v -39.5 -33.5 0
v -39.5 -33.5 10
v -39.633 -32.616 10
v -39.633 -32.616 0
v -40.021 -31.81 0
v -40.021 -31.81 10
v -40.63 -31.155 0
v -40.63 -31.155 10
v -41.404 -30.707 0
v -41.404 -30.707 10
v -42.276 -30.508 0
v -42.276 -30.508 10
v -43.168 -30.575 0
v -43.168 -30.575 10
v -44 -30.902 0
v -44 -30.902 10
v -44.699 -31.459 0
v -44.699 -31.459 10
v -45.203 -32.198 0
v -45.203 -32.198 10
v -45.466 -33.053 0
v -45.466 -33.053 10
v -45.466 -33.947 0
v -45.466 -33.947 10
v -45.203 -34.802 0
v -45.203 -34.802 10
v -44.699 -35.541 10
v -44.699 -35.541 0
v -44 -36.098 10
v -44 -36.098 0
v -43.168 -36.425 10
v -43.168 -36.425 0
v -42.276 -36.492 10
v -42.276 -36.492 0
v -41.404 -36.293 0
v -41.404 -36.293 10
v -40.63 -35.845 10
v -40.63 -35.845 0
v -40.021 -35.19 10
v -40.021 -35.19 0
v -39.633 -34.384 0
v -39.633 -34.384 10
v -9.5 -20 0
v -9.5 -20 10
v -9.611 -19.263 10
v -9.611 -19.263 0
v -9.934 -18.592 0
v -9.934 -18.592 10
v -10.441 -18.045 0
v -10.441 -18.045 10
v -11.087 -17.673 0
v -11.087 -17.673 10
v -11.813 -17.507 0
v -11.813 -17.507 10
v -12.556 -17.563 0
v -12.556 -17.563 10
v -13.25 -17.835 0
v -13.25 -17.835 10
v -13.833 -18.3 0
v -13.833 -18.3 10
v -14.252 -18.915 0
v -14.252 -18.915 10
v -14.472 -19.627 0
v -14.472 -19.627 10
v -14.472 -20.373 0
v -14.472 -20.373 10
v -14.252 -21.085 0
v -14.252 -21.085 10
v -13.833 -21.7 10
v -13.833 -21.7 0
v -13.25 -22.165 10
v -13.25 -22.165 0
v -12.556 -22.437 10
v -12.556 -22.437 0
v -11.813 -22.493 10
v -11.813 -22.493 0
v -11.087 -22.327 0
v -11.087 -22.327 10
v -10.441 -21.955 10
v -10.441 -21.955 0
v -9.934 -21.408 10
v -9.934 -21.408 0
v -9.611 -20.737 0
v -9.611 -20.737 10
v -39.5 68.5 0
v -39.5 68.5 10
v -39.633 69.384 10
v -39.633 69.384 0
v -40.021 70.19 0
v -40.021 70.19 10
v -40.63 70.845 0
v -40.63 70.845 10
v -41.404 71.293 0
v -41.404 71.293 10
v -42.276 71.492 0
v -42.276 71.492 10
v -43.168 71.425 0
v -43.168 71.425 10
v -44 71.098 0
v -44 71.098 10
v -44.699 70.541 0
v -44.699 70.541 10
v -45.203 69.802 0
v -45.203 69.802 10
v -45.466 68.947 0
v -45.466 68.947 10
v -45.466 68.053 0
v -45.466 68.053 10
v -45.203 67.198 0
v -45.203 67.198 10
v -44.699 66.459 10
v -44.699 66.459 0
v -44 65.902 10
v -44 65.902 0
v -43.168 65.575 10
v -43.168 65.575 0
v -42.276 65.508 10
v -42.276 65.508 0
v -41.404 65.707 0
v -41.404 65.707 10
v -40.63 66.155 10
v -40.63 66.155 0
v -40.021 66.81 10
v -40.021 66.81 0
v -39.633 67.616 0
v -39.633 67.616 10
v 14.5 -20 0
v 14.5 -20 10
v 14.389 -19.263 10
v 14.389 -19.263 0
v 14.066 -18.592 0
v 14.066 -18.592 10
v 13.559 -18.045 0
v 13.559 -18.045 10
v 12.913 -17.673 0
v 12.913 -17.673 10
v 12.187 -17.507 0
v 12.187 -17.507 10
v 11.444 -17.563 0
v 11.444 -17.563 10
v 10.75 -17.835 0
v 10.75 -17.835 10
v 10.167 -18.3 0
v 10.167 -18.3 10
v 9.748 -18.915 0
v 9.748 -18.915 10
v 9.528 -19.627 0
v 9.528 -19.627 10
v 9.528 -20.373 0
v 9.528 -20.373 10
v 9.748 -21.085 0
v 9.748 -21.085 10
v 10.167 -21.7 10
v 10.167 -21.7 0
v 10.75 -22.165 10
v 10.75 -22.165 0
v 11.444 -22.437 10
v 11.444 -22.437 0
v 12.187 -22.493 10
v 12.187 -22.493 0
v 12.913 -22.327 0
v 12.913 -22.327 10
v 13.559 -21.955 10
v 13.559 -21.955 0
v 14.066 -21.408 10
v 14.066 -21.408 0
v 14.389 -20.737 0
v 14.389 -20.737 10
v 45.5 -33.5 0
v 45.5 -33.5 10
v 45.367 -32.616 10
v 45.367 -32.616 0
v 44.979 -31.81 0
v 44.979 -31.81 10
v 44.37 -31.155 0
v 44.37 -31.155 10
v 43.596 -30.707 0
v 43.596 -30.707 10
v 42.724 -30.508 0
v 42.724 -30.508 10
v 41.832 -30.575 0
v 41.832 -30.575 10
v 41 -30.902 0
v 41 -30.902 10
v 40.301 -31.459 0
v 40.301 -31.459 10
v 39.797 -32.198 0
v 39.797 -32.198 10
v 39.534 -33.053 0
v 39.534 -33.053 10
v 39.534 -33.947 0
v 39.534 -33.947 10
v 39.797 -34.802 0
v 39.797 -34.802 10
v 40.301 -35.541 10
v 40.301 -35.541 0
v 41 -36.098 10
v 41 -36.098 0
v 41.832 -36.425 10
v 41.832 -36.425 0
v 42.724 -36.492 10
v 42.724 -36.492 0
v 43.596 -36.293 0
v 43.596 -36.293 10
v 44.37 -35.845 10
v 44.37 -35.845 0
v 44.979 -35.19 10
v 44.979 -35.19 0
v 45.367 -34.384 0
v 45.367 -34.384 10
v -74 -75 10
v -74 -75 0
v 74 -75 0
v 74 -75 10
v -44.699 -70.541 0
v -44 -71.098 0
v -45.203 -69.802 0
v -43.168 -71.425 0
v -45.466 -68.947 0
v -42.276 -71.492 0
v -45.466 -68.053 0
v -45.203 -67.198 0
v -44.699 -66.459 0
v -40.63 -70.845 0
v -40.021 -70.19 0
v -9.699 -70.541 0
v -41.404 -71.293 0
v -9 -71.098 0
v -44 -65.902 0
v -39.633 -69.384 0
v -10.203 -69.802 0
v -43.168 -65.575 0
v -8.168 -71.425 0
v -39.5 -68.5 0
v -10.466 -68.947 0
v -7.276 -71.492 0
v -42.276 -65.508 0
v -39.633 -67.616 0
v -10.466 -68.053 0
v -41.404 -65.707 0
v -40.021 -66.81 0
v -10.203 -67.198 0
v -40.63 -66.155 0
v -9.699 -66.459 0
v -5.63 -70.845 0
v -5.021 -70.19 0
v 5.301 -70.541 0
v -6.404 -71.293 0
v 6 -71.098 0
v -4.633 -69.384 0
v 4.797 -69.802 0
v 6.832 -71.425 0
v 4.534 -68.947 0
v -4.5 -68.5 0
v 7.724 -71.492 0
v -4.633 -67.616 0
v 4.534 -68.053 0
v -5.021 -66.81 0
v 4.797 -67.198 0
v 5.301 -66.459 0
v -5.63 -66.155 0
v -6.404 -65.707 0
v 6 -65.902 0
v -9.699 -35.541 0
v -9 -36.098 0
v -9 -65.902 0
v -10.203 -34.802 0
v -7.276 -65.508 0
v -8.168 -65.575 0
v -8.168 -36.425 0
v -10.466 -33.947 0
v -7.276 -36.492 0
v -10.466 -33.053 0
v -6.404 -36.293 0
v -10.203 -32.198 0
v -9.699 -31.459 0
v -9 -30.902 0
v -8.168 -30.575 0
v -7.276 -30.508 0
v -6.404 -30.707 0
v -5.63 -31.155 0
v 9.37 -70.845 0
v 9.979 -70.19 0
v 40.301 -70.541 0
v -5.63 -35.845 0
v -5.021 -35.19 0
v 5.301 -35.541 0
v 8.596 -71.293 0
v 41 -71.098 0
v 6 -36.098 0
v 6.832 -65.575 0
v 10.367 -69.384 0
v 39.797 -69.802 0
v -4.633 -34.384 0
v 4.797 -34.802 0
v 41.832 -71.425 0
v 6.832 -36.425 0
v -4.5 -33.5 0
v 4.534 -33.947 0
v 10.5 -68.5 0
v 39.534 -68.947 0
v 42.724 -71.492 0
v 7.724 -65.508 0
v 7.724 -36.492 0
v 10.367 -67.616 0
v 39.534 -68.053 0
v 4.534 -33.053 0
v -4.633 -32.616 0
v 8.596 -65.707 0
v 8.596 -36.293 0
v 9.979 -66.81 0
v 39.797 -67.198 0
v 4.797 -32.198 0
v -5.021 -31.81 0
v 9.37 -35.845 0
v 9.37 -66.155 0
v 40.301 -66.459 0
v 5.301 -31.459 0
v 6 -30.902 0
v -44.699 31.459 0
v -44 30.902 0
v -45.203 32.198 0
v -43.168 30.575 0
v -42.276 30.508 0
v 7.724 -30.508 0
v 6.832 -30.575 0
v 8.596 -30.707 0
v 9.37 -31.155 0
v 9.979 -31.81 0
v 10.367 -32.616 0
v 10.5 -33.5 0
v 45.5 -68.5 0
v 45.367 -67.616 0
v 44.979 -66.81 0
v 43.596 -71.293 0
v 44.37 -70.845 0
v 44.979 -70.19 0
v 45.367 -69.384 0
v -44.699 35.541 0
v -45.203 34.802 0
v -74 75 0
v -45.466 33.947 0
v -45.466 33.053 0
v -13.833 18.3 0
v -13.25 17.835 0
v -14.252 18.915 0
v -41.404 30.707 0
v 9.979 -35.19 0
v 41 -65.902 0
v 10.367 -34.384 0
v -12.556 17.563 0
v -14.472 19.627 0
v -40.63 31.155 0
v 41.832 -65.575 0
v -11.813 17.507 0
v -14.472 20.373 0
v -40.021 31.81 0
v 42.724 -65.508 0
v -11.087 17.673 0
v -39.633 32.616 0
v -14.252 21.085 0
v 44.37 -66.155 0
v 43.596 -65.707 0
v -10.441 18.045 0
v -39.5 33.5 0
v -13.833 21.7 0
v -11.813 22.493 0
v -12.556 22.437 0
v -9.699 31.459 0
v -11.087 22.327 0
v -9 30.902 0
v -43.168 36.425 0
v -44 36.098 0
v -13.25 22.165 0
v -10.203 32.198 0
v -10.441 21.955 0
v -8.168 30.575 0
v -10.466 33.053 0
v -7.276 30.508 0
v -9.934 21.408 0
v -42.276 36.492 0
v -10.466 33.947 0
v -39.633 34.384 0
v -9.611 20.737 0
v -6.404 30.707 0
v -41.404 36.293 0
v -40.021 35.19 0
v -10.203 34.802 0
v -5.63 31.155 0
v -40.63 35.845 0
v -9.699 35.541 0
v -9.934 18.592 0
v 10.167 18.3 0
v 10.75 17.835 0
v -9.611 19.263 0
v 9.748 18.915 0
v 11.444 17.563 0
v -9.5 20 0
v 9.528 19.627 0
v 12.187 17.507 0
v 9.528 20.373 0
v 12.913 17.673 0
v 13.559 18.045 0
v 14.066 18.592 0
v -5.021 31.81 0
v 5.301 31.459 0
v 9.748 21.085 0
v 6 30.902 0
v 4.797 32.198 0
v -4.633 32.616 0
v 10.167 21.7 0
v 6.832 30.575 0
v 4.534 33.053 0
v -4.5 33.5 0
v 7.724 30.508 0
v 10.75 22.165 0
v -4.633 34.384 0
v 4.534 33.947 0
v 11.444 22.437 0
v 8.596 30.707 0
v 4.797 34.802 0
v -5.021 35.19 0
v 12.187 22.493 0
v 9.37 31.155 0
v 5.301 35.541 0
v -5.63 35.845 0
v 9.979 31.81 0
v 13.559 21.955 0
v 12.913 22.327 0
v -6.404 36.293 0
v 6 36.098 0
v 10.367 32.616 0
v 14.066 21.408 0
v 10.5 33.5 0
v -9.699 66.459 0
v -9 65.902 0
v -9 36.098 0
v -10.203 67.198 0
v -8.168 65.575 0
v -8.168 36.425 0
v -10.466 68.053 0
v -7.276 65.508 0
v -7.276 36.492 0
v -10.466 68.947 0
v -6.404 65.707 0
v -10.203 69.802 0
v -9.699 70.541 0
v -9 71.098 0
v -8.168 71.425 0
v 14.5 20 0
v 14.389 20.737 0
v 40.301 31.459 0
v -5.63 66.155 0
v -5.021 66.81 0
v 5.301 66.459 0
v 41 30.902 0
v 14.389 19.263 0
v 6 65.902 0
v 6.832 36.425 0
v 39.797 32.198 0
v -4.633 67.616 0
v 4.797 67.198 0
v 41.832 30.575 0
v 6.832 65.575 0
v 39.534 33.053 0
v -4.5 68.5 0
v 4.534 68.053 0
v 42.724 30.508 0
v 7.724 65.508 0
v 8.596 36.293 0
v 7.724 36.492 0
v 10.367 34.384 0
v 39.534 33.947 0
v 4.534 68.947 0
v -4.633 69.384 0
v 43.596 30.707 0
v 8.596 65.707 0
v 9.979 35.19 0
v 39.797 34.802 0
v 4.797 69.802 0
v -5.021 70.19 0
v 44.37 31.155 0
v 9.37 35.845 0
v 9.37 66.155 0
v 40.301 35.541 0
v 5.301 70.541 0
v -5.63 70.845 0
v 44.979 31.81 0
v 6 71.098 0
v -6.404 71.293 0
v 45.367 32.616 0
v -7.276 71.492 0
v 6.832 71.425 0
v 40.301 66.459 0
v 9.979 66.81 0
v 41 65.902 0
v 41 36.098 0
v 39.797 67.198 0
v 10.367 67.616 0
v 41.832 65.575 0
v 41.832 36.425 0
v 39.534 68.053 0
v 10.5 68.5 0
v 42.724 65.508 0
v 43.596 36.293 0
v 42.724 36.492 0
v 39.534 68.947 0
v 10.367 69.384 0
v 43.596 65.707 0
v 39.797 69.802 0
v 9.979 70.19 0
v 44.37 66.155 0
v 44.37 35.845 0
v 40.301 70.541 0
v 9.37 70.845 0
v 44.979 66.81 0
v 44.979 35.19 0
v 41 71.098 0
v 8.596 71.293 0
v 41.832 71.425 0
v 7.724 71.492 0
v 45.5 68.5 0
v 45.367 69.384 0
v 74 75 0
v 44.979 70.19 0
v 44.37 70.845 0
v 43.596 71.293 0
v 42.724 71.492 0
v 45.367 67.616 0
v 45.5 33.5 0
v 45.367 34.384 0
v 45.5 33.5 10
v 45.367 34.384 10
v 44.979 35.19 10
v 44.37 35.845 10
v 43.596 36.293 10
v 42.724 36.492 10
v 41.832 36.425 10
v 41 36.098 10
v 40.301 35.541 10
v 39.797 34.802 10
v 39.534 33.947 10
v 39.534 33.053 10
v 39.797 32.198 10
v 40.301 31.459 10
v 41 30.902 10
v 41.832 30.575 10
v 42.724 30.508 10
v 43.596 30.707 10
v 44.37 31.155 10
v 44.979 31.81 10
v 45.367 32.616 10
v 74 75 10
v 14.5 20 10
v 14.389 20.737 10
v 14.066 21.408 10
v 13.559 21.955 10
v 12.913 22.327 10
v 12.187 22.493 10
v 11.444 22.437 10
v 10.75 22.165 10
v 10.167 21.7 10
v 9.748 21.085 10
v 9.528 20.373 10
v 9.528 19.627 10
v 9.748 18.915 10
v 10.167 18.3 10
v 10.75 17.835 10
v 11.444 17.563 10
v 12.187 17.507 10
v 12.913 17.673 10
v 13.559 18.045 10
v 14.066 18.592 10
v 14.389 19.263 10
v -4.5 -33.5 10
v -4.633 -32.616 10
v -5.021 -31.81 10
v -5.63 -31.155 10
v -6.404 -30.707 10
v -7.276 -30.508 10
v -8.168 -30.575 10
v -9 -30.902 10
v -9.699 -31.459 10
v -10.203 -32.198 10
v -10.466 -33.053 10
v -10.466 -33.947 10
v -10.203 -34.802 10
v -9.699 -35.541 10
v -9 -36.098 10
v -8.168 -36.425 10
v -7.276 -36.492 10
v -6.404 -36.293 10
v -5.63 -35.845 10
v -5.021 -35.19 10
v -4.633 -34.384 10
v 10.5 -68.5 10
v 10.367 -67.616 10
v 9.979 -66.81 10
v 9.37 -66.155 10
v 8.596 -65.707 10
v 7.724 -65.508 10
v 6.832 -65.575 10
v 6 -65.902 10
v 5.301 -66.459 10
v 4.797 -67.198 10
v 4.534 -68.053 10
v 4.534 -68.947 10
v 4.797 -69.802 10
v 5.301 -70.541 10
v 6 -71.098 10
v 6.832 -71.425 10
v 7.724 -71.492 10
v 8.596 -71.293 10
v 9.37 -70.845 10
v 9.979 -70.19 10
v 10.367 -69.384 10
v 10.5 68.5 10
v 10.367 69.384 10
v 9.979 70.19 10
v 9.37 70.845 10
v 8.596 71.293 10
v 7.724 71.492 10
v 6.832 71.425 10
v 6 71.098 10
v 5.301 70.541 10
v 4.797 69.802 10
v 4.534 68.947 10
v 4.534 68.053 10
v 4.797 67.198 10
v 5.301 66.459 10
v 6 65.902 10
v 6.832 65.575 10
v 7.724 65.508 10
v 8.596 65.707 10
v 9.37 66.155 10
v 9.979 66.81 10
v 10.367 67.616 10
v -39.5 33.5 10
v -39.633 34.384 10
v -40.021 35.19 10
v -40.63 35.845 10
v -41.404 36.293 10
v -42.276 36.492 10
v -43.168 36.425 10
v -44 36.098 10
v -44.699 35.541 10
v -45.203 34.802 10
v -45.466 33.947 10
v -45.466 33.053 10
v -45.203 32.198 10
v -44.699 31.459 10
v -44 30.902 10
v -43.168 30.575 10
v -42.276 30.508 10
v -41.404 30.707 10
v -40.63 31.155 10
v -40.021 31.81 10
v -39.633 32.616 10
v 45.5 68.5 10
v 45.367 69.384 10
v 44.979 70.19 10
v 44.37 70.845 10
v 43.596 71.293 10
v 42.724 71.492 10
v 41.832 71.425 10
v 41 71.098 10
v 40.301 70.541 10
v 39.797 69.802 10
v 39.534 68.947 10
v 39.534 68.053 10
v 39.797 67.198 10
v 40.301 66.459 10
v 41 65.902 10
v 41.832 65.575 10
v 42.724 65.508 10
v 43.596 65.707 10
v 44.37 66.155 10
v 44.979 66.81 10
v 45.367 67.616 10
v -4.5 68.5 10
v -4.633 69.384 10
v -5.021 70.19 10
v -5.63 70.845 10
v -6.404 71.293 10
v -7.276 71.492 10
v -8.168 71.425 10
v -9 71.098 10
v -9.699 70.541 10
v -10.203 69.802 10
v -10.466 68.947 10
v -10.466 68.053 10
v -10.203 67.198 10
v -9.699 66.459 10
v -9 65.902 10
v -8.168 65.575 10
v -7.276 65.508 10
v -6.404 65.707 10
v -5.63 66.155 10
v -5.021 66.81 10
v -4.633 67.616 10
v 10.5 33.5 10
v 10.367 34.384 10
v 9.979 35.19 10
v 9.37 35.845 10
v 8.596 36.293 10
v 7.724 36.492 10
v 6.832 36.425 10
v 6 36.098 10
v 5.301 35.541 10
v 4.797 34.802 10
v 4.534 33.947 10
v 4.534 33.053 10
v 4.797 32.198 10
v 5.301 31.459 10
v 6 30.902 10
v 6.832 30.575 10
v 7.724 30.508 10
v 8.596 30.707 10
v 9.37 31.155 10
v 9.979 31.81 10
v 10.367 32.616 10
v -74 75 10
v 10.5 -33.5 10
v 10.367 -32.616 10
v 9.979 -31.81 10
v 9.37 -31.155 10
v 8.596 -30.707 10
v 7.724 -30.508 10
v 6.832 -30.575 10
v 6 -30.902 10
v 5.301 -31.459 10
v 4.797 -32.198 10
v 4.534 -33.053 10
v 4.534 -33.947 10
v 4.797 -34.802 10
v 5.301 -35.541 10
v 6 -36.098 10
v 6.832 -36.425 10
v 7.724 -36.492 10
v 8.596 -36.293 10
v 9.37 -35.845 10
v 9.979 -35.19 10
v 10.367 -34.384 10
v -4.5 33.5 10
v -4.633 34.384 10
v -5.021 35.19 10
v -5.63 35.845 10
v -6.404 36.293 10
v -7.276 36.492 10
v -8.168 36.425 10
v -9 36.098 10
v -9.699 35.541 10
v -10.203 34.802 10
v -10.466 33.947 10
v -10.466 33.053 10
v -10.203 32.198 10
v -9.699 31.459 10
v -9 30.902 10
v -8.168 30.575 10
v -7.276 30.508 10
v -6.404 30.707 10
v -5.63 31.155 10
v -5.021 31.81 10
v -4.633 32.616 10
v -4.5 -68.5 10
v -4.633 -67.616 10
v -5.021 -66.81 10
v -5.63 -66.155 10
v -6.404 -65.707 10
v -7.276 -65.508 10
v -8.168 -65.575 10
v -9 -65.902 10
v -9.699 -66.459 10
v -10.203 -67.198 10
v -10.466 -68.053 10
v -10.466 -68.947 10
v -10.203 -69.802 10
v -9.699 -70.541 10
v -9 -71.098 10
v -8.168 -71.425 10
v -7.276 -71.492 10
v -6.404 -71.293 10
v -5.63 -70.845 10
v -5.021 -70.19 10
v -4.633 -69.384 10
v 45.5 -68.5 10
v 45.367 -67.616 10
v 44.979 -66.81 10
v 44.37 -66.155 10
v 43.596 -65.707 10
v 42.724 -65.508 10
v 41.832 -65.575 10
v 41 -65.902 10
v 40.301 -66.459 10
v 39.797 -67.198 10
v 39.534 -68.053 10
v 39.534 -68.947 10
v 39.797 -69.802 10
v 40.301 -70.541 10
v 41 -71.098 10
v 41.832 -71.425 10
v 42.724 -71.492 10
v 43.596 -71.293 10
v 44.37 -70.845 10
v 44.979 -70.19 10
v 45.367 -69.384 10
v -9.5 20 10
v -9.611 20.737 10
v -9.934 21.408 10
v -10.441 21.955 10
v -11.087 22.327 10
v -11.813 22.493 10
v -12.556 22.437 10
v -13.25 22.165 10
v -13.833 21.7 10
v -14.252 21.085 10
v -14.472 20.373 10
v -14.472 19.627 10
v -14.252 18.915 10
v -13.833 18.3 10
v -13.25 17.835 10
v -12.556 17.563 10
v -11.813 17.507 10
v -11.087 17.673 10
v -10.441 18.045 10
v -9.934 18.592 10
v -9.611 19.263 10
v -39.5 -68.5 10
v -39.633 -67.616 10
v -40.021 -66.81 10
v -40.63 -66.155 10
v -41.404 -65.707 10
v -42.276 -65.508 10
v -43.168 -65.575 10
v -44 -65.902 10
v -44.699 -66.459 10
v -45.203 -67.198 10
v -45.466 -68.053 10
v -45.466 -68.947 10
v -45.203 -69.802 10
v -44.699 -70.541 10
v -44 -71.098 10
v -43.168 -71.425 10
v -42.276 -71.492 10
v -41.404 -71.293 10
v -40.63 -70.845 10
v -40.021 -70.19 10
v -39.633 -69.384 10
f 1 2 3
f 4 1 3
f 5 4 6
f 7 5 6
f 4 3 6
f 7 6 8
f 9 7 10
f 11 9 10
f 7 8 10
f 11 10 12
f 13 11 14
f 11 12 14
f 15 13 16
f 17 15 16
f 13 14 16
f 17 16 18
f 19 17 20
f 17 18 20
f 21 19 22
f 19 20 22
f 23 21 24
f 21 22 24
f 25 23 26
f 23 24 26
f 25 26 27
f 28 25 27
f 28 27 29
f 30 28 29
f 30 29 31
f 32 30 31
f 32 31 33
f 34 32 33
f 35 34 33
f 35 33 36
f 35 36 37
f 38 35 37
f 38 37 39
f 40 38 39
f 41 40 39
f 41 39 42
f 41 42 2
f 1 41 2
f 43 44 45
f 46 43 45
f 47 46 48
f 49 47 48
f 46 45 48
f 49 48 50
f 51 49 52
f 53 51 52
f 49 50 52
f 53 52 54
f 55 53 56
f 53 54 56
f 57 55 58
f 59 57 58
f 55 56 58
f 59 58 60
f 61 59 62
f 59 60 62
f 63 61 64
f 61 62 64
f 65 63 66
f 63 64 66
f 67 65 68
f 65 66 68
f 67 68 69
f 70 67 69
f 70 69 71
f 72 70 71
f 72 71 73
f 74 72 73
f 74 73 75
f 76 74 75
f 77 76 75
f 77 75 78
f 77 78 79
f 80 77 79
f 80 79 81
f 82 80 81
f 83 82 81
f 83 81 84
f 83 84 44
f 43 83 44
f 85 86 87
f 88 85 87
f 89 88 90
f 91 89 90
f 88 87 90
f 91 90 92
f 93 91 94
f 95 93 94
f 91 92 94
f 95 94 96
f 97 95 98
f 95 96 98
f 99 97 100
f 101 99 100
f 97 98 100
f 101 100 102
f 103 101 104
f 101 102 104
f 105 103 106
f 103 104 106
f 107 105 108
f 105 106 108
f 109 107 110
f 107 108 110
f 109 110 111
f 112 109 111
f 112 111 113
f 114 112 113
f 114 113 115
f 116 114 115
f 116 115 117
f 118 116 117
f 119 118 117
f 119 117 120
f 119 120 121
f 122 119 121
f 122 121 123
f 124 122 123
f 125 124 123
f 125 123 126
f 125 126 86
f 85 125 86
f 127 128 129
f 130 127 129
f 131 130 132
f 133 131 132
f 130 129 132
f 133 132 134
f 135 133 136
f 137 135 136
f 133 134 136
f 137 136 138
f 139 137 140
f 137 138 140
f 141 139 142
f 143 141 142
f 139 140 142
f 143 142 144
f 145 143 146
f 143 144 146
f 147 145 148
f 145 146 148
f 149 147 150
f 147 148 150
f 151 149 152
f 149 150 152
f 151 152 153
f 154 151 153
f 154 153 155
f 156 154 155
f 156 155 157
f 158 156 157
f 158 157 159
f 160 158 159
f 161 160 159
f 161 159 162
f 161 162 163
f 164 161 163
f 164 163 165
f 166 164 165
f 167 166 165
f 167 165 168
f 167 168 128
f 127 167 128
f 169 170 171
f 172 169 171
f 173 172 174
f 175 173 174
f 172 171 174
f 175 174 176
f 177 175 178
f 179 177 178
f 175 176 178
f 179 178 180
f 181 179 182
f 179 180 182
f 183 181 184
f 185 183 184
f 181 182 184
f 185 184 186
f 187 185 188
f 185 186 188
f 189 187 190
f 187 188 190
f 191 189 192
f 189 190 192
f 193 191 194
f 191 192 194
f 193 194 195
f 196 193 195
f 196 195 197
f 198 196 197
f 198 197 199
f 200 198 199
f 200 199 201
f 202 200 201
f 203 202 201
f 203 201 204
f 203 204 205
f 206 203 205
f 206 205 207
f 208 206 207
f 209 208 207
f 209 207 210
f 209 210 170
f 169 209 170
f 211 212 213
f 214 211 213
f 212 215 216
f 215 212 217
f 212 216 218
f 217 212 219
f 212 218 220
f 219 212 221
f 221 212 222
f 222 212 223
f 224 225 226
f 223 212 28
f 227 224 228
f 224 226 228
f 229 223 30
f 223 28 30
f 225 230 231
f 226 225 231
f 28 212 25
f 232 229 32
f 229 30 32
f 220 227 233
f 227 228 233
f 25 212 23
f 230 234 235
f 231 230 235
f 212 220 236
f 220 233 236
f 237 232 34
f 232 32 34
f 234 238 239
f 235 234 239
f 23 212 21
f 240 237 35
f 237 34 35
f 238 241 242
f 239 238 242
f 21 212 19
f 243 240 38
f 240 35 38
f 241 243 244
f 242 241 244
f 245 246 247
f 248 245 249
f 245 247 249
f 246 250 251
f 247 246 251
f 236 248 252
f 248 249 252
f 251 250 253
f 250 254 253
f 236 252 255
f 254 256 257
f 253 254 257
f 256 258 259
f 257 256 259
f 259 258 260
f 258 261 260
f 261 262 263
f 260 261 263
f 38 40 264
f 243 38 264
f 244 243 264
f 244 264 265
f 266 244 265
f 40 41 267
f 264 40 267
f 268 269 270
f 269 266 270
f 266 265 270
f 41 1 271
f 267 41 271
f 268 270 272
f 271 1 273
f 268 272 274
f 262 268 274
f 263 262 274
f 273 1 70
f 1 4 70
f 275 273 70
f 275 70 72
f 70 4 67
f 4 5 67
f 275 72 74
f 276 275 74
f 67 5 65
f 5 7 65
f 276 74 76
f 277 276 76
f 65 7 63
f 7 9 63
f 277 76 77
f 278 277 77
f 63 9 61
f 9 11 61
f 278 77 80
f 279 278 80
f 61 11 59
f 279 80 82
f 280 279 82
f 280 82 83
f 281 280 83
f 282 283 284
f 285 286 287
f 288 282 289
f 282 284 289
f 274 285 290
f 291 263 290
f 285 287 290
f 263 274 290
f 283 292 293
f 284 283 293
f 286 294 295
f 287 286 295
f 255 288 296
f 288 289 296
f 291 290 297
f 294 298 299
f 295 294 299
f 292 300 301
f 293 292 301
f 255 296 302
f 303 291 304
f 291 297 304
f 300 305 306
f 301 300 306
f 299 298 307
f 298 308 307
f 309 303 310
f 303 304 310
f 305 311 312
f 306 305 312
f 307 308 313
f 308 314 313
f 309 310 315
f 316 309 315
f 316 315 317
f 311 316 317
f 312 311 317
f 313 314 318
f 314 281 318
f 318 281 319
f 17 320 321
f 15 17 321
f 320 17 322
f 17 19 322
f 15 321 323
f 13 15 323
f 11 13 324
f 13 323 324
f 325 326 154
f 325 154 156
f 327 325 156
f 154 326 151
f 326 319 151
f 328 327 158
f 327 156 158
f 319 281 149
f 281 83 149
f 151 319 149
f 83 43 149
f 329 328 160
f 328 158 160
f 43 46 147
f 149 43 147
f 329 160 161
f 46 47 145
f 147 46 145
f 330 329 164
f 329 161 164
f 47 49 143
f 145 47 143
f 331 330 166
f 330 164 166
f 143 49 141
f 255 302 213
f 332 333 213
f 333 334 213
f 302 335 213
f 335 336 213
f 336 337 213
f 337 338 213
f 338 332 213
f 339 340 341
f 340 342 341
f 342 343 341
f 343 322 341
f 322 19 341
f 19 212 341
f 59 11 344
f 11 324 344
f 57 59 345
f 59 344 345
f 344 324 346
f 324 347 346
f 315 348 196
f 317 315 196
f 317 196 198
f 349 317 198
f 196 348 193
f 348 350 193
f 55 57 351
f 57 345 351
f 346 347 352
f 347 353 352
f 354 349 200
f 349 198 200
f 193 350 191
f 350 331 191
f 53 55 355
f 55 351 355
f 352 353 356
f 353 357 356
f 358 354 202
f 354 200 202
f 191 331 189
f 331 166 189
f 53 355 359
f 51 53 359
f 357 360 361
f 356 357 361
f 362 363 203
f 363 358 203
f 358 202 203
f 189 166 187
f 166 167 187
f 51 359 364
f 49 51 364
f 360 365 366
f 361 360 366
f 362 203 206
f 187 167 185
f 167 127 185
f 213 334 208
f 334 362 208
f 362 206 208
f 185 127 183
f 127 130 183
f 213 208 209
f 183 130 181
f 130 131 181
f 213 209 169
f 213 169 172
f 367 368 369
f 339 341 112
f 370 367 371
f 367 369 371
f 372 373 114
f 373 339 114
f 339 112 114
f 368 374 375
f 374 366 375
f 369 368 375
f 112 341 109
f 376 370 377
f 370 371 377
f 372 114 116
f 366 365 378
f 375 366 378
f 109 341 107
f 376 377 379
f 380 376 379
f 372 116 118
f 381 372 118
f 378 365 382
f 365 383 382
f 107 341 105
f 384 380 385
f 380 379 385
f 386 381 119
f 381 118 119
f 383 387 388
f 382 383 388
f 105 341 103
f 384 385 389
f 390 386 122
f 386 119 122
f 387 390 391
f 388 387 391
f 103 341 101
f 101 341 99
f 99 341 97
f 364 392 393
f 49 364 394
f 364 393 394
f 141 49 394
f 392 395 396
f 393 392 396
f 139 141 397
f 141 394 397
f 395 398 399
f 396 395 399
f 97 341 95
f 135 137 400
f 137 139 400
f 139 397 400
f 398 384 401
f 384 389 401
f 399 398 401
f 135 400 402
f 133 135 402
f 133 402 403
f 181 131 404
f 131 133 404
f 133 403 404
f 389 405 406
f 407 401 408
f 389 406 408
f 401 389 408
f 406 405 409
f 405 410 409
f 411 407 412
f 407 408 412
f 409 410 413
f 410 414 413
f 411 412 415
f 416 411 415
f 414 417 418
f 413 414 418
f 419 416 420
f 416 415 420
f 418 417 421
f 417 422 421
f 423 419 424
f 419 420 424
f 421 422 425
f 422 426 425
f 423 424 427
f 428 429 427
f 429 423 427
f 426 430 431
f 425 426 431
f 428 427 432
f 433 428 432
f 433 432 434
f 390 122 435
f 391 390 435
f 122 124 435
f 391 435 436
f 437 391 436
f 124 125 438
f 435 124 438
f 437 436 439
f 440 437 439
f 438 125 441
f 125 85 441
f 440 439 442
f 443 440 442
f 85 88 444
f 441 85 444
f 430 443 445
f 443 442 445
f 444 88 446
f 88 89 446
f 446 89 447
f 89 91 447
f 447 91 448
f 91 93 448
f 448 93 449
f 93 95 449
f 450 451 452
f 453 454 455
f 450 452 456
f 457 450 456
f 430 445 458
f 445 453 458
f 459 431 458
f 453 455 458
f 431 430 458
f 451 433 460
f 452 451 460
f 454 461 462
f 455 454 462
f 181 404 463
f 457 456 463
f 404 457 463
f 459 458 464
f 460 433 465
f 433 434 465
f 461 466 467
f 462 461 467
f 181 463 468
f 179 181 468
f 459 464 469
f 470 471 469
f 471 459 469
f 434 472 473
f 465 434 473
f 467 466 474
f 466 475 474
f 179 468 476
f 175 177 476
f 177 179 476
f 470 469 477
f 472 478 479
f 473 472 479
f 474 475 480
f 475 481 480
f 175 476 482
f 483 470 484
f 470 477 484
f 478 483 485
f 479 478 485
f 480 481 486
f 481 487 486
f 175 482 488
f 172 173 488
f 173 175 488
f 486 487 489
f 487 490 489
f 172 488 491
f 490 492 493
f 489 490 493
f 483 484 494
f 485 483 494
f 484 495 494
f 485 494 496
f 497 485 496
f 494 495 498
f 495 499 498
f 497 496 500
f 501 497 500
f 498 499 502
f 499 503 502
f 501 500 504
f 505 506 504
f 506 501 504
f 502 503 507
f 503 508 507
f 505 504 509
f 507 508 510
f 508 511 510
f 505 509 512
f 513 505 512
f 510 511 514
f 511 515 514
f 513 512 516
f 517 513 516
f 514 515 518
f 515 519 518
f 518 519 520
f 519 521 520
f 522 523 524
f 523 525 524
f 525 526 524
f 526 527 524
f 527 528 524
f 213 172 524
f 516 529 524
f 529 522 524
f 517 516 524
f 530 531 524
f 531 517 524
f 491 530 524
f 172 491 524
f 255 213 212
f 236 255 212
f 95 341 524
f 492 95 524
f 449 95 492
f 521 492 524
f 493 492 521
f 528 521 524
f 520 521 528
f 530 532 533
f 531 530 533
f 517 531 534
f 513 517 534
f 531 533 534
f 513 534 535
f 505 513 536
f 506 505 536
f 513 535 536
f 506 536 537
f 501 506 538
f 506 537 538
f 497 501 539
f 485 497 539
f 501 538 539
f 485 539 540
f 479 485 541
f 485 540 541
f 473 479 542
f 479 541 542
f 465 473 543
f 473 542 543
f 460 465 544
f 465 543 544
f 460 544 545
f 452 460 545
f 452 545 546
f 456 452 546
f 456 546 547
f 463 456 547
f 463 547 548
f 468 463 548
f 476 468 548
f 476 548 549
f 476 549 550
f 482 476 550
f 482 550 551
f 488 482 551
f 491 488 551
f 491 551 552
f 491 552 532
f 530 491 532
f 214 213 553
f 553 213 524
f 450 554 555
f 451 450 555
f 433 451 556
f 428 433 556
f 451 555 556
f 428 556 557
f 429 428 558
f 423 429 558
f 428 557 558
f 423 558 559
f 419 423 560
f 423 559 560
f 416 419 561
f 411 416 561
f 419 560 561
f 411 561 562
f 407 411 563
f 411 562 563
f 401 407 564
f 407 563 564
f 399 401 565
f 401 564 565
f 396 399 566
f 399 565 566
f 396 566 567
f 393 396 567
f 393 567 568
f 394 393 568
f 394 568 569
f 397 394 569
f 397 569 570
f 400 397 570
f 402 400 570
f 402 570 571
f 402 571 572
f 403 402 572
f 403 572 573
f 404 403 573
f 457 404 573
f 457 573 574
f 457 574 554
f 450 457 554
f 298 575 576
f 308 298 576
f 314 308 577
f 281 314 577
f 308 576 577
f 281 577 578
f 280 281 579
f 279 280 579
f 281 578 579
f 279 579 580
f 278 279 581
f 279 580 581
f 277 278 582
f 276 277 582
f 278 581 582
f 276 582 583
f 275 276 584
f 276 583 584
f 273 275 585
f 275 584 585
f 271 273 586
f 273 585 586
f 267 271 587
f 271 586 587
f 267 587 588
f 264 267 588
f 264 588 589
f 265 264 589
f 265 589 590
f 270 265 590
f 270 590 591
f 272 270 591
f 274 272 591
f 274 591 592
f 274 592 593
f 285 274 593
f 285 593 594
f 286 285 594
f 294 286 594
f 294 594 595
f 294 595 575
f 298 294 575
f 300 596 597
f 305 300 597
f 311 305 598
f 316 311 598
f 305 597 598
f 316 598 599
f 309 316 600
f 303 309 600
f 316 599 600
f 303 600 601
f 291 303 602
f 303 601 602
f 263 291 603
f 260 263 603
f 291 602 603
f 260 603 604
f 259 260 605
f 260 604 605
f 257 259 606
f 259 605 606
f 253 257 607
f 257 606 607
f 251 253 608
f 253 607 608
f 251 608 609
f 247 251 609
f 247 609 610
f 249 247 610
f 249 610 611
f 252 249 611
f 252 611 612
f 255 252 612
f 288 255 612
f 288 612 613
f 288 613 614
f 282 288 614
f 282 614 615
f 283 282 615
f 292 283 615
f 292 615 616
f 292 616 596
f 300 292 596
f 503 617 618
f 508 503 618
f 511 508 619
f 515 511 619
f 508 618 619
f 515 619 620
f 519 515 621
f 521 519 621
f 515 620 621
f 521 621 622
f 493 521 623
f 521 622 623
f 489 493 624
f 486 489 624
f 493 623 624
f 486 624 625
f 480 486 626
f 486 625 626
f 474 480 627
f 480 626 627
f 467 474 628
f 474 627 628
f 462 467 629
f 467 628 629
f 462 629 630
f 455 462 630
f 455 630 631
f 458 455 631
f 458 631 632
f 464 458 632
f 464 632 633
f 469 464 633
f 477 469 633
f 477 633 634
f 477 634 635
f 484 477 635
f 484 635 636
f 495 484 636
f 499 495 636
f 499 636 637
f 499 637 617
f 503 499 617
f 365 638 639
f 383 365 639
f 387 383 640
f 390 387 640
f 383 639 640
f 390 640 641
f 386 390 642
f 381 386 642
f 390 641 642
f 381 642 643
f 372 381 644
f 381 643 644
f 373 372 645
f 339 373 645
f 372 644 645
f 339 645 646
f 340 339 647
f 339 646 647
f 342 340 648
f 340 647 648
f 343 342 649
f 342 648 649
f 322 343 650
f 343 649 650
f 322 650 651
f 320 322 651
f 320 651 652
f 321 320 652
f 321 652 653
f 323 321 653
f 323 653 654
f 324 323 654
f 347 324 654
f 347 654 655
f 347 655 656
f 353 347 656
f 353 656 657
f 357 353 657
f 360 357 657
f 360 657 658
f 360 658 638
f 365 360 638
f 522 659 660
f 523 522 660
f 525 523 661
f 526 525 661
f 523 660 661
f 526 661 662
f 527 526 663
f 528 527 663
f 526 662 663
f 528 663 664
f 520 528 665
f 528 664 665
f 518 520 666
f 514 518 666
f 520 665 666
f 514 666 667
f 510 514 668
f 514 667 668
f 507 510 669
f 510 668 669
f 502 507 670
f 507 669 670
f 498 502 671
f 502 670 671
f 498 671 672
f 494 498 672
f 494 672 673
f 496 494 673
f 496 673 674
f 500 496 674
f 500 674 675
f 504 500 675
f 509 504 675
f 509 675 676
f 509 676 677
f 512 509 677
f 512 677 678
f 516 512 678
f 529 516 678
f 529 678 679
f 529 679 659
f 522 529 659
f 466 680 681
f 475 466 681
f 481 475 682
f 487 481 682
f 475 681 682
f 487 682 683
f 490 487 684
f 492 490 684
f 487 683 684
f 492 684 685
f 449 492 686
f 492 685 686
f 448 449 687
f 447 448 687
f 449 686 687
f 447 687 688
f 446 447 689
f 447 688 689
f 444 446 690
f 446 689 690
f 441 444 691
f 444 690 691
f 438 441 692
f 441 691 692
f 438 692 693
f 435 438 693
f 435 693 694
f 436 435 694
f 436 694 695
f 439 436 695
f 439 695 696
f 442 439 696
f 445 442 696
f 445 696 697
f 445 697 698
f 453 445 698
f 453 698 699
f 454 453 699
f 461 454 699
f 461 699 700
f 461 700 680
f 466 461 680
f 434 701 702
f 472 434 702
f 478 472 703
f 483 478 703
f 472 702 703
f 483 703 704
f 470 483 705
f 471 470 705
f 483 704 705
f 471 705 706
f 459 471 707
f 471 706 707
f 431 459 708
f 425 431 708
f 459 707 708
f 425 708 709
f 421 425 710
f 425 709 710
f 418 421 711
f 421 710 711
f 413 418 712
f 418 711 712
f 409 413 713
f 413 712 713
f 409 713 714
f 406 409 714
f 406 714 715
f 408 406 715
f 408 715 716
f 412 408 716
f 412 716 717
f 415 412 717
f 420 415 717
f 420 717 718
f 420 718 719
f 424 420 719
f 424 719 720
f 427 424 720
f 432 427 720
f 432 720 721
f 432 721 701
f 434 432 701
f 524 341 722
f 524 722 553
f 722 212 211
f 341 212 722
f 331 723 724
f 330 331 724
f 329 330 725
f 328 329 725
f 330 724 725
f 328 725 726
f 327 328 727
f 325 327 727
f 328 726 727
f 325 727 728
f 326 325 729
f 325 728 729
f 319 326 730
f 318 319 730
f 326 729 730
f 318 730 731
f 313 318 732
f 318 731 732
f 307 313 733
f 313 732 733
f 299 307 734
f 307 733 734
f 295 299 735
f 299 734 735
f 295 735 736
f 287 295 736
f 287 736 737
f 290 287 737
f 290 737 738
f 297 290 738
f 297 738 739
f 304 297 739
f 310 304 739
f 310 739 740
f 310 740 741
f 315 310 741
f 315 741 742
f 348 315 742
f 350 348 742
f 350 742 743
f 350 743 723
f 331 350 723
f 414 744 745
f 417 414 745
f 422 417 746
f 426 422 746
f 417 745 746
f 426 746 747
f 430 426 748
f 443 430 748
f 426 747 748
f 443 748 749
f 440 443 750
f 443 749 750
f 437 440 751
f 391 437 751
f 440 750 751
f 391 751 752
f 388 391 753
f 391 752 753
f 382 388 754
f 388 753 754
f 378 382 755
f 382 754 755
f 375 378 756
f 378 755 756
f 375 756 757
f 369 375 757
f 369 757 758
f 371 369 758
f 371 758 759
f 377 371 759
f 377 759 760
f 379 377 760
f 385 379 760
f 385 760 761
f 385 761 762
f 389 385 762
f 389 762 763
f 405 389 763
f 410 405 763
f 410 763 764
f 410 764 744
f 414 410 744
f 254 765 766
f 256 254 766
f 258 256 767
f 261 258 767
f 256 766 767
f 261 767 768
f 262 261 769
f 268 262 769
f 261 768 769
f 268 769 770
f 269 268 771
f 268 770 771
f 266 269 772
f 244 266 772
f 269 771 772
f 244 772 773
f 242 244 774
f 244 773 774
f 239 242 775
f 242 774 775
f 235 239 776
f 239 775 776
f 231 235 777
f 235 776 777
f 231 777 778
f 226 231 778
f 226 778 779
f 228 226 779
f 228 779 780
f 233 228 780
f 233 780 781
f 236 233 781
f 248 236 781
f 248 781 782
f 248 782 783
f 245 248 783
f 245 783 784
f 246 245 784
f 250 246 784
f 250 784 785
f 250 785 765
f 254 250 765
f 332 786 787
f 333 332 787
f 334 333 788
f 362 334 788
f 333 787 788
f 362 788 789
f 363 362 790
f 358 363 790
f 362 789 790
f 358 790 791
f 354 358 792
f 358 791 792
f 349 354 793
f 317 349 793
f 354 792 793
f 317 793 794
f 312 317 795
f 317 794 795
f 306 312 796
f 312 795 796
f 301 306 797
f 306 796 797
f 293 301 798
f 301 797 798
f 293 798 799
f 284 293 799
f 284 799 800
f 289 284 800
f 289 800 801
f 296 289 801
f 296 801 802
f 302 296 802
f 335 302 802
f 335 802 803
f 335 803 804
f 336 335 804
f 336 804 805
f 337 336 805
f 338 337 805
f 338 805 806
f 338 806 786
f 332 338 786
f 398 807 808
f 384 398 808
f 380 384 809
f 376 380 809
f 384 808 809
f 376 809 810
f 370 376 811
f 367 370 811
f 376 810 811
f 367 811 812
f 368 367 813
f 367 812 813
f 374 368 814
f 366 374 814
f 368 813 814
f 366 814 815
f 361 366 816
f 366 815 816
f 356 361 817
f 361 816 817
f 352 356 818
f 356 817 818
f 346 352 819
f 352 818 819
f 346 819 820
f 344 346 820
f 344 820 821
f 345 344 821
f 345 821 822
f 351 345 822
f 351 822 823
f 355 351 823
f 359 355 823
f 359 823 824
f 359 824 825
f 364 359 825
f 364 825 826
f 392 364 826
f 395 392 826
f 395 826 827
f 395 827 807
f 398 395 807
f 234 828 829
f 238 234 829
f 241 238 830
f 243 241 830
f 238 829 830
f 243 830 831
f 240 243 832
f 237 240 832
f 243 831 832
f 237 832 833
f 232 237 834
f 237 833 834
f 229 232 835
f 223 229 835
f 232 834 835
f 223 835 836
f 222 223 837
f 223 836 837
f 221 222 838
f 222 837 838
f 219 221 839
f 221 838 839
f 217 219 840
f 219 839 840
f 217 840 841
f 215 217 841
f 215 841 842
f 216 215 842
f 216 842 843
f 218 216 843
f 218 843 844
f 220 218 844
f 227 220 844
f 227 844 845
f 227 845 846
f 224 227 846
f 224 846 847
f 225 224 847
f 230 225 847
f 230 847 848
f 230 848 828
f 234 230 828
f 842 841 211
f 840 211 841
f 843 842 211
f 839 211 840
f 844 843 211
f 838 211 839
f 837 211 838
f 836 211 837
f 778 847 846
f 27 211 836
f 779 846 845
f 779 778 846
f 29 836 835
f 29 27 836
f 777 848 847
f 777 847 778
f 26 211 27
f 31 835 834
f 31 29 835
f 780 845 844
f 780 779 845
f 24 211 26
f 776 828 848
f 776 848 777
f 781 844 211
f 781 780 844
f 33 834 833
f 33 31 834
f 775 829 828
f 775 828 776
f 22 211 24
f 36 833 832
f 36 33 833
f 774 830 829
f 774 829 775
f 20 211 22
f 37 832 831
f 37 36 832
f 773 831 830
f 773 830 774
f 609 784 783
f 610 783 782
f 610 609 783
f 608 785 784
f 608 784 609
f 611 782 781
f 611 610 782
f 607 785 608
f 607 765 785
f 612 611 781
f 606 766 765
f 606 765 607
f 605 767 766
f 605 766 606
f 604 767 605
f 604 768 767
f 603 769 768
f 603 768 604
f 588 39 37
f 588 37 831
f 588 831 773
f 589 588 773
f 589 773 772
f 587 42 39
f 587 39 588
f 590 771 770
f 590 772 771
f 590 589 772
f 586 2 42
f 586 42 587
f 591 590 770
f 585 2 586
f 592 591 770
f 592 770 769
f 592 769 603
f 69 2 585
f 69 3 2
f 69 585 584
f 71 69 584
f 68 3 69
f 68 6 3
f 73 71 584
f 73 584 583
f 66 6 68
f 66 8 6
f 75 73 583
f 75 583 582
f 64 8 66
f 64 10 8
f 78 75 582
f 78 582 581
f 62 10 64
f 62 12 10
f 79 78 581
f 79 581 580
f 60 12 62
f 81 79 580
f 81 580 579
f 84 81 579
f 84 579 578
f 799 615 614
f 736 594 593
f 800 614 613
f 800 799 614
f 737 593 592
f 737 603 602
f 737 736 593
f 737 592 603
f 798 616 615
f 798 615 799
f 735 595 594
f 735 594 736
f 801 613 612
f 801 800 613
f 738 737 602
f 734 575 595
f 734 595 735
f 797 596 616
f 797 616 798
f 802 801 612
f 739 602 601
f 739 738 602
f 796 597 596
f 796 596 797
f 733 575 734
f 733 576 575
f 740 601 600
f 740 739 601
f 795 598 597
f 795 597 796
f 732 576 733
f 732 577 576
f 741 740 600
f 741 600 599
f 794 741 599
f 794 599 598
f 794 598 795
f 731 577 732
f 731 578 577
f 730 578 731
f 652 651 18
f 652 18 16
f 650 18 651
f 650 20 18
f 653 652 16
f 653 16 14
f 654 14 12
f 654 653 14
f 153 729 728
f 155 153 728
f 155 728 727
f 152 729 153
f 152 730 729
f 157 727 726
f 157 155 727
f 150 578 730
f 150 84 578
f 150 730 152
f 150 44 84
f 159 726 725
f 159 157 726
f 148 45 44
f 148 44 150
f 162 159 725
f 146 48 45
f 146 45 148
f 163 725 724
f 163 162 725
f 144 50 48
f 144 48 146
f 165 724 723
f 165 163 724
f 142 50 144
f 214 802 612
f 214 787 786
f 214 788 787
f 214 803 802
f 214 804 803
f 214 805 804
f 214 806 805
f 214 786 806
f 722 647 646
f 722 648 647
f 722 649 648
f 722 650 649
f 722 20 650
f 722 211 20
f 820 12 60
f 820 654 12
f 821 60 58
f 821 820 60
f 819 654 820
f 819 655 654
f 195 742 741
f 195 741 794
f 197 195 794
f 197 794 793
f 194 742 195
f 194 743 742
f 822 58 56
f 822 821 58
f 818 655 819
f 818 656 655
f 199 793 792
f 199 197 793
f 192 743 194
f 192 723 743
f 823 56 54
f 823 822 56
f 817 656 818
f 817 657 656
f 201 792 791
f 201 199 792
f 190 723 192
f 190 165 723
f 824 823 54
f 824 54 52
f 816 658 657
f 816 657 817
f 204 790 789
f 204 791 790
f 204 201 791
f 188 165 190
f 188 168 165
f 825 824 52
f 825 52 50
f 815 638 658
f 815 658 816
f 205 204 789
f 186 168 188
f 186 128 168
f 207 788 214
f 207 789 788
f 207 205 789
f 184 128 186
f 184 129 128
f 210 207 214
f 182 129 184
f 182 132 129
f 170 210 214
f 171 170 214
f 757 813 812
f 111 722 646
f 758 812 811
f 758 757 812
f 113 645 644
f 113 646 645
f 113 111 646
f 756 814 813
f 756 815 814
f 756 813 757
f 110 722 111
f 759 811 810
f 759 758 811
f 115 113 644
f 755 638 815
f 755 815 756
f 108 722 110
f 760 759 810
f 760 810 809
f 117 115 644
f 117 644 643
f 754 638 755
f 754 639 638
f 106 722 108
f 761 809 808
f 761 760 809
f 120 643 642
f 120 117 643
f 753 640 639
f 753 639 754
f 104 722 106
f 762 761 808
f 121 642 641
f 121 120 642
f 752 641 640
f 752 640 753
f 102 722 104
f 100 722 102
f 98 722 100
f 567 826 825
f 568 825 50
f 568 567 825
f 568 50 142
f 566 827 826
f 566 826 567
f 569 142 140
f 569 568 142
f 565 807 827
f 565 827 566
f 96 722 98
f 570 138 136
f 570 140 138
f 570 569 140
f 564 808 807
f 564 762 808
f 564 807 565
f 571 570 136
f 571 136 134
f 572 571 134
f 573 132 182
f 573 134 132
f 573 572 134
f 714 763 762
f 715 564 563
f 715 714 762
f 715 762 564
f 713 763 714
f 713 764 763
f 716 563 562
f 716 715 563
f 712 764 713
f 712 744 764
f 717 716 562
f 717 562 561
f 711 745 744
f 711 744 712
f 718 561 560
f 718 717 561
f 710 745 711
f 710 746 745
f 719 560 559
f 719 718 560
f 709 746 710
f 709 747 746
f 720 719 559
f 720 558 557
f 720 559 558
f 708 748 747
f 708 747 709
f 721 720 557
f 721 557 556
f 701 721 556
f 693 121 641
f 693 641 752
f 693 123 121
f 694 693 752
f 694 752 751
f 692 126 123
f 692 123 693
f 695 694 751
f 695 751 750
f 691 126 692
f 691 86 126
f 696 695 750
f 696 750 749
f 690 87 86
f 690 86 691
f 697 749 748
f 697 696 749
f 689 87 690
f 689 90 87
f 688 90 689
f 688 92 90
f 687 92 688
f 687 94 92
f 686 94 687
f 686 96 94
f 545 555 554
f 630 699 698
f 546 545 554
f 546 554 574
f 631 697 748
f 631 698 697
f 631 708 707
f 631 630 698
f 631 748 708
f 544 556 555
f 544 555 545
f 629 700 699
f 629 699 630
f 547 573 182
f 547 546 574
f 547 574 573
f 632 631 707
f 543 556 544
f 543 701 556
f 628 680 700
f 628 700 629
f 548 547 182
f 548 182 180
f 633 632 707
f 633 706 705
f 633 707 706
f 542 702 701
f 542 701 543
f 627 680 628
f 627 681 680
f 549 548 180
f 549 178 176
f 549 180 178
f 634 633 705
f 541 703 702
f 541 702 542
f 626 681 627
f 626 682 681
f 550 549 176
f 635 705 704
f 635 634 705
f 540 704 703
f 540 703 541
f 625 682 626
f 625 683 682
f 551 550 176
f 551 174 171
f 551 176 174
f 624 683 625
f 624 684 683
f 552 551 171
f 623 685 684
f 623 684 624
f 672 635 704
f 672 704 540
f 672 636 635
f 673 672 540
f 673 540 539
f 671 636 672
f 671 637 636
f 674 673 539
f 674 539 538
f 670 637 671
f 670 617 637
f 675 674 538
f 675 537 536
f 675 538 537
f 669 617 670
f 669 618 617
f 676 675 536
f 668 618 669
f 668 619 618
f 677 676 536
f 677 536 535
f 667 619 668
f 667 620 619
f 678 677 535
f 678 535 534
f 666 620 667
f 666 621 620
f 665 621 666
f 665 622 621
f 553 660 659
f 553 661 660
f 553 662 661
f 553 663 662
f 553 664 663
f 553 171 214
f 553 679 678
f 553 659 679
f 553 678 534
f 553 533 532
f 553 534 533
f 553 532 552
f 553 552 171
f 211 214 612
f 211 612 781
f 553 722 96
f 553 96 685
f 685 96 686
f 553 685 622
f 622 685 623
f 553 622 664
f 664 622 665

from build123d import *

# Parameters (mm, degrees)
SKETCH1_W           = 148
SKETCH1_H           = 150
BOSS_EXTRUDE1_DEPTH = 10
SKETCH2_R           = 3
SKETCH2_R_2         = 2.5
CUT_EXTRUDE1_DEPTH  = 11


with BuildPart() as part:
    # Sketch1 → Boss-Extrude1 (new body)
    with BuildSketch(Plane.XY):
        Rectangle(SKETCH1_W, SKETCH1_H)
    extrude(amount=BOSS_EXTRUDE1_DEPTH)

    # Sketch2 → Cut-Extrude1 (cut, through all)
    with BuildSketch(Plane.XY.offset(10)):
        with Locations((-42.5, 68.5)):
            Circle(SKETCH2_R)
        with Locations((-42.5, 33.5)):
            Circle(SKETCH2_R)
        with Locations((42.5, 33.5)):
            Circle(SKETCH2_R)
        with Locations((42.5, 68.5)):
            Circle(SKETCH2_R)
        with Locations((-7.5, 68.5)):
            Circle(SKETCH2_R)
        with Locations((7.5, 68.5)):
            Circle(SKETCH2_R)
        with Locations((-7.5, 33.5)):
            Circle(SKETCH2_R)
        with Locations((7.5, 33.5)):
            Circle(SKETCH2_R)
        with Locations((-12, 20)):
            Circle(SKETCH2_R_2)
        with Locations((12, 20)):
            Circle(SKETCH2_R_2)
        with Locations((12, -20)):
            Circle(SKETCH2_R_2)
        with Locations((-12, -20)):
            Circle(SKETCH2_R_2)
        with Locations((7.5, -33.5)):
            Circle(SKETCH2_R)
        with Locations((-7.5, -33.5)):
            Circle(SKETCH2_R)
        with Locations((7.5, -68.5)):
            Circle(SKETCH2_R)
        with Locations((-7.5, -68.5)):
            Circle(SKETCH2_R)
        with Locations((42.5, -68.5)):
            Circle(SKETCH2_R)
        with Locations((42.5, -33.5)):
            Circle(SKETCH2_R)
        with Locations((-42.5, -33.5)):
            Circle(SKETCH2_R)
        with Locations((-42.5, -68.5)):
            Circle(SKETCH2_R)
    extrude(amount=-CUT_EXTRUDE1_DEPTH, mode=Mode.SUBTRACT)


solid = part.part
